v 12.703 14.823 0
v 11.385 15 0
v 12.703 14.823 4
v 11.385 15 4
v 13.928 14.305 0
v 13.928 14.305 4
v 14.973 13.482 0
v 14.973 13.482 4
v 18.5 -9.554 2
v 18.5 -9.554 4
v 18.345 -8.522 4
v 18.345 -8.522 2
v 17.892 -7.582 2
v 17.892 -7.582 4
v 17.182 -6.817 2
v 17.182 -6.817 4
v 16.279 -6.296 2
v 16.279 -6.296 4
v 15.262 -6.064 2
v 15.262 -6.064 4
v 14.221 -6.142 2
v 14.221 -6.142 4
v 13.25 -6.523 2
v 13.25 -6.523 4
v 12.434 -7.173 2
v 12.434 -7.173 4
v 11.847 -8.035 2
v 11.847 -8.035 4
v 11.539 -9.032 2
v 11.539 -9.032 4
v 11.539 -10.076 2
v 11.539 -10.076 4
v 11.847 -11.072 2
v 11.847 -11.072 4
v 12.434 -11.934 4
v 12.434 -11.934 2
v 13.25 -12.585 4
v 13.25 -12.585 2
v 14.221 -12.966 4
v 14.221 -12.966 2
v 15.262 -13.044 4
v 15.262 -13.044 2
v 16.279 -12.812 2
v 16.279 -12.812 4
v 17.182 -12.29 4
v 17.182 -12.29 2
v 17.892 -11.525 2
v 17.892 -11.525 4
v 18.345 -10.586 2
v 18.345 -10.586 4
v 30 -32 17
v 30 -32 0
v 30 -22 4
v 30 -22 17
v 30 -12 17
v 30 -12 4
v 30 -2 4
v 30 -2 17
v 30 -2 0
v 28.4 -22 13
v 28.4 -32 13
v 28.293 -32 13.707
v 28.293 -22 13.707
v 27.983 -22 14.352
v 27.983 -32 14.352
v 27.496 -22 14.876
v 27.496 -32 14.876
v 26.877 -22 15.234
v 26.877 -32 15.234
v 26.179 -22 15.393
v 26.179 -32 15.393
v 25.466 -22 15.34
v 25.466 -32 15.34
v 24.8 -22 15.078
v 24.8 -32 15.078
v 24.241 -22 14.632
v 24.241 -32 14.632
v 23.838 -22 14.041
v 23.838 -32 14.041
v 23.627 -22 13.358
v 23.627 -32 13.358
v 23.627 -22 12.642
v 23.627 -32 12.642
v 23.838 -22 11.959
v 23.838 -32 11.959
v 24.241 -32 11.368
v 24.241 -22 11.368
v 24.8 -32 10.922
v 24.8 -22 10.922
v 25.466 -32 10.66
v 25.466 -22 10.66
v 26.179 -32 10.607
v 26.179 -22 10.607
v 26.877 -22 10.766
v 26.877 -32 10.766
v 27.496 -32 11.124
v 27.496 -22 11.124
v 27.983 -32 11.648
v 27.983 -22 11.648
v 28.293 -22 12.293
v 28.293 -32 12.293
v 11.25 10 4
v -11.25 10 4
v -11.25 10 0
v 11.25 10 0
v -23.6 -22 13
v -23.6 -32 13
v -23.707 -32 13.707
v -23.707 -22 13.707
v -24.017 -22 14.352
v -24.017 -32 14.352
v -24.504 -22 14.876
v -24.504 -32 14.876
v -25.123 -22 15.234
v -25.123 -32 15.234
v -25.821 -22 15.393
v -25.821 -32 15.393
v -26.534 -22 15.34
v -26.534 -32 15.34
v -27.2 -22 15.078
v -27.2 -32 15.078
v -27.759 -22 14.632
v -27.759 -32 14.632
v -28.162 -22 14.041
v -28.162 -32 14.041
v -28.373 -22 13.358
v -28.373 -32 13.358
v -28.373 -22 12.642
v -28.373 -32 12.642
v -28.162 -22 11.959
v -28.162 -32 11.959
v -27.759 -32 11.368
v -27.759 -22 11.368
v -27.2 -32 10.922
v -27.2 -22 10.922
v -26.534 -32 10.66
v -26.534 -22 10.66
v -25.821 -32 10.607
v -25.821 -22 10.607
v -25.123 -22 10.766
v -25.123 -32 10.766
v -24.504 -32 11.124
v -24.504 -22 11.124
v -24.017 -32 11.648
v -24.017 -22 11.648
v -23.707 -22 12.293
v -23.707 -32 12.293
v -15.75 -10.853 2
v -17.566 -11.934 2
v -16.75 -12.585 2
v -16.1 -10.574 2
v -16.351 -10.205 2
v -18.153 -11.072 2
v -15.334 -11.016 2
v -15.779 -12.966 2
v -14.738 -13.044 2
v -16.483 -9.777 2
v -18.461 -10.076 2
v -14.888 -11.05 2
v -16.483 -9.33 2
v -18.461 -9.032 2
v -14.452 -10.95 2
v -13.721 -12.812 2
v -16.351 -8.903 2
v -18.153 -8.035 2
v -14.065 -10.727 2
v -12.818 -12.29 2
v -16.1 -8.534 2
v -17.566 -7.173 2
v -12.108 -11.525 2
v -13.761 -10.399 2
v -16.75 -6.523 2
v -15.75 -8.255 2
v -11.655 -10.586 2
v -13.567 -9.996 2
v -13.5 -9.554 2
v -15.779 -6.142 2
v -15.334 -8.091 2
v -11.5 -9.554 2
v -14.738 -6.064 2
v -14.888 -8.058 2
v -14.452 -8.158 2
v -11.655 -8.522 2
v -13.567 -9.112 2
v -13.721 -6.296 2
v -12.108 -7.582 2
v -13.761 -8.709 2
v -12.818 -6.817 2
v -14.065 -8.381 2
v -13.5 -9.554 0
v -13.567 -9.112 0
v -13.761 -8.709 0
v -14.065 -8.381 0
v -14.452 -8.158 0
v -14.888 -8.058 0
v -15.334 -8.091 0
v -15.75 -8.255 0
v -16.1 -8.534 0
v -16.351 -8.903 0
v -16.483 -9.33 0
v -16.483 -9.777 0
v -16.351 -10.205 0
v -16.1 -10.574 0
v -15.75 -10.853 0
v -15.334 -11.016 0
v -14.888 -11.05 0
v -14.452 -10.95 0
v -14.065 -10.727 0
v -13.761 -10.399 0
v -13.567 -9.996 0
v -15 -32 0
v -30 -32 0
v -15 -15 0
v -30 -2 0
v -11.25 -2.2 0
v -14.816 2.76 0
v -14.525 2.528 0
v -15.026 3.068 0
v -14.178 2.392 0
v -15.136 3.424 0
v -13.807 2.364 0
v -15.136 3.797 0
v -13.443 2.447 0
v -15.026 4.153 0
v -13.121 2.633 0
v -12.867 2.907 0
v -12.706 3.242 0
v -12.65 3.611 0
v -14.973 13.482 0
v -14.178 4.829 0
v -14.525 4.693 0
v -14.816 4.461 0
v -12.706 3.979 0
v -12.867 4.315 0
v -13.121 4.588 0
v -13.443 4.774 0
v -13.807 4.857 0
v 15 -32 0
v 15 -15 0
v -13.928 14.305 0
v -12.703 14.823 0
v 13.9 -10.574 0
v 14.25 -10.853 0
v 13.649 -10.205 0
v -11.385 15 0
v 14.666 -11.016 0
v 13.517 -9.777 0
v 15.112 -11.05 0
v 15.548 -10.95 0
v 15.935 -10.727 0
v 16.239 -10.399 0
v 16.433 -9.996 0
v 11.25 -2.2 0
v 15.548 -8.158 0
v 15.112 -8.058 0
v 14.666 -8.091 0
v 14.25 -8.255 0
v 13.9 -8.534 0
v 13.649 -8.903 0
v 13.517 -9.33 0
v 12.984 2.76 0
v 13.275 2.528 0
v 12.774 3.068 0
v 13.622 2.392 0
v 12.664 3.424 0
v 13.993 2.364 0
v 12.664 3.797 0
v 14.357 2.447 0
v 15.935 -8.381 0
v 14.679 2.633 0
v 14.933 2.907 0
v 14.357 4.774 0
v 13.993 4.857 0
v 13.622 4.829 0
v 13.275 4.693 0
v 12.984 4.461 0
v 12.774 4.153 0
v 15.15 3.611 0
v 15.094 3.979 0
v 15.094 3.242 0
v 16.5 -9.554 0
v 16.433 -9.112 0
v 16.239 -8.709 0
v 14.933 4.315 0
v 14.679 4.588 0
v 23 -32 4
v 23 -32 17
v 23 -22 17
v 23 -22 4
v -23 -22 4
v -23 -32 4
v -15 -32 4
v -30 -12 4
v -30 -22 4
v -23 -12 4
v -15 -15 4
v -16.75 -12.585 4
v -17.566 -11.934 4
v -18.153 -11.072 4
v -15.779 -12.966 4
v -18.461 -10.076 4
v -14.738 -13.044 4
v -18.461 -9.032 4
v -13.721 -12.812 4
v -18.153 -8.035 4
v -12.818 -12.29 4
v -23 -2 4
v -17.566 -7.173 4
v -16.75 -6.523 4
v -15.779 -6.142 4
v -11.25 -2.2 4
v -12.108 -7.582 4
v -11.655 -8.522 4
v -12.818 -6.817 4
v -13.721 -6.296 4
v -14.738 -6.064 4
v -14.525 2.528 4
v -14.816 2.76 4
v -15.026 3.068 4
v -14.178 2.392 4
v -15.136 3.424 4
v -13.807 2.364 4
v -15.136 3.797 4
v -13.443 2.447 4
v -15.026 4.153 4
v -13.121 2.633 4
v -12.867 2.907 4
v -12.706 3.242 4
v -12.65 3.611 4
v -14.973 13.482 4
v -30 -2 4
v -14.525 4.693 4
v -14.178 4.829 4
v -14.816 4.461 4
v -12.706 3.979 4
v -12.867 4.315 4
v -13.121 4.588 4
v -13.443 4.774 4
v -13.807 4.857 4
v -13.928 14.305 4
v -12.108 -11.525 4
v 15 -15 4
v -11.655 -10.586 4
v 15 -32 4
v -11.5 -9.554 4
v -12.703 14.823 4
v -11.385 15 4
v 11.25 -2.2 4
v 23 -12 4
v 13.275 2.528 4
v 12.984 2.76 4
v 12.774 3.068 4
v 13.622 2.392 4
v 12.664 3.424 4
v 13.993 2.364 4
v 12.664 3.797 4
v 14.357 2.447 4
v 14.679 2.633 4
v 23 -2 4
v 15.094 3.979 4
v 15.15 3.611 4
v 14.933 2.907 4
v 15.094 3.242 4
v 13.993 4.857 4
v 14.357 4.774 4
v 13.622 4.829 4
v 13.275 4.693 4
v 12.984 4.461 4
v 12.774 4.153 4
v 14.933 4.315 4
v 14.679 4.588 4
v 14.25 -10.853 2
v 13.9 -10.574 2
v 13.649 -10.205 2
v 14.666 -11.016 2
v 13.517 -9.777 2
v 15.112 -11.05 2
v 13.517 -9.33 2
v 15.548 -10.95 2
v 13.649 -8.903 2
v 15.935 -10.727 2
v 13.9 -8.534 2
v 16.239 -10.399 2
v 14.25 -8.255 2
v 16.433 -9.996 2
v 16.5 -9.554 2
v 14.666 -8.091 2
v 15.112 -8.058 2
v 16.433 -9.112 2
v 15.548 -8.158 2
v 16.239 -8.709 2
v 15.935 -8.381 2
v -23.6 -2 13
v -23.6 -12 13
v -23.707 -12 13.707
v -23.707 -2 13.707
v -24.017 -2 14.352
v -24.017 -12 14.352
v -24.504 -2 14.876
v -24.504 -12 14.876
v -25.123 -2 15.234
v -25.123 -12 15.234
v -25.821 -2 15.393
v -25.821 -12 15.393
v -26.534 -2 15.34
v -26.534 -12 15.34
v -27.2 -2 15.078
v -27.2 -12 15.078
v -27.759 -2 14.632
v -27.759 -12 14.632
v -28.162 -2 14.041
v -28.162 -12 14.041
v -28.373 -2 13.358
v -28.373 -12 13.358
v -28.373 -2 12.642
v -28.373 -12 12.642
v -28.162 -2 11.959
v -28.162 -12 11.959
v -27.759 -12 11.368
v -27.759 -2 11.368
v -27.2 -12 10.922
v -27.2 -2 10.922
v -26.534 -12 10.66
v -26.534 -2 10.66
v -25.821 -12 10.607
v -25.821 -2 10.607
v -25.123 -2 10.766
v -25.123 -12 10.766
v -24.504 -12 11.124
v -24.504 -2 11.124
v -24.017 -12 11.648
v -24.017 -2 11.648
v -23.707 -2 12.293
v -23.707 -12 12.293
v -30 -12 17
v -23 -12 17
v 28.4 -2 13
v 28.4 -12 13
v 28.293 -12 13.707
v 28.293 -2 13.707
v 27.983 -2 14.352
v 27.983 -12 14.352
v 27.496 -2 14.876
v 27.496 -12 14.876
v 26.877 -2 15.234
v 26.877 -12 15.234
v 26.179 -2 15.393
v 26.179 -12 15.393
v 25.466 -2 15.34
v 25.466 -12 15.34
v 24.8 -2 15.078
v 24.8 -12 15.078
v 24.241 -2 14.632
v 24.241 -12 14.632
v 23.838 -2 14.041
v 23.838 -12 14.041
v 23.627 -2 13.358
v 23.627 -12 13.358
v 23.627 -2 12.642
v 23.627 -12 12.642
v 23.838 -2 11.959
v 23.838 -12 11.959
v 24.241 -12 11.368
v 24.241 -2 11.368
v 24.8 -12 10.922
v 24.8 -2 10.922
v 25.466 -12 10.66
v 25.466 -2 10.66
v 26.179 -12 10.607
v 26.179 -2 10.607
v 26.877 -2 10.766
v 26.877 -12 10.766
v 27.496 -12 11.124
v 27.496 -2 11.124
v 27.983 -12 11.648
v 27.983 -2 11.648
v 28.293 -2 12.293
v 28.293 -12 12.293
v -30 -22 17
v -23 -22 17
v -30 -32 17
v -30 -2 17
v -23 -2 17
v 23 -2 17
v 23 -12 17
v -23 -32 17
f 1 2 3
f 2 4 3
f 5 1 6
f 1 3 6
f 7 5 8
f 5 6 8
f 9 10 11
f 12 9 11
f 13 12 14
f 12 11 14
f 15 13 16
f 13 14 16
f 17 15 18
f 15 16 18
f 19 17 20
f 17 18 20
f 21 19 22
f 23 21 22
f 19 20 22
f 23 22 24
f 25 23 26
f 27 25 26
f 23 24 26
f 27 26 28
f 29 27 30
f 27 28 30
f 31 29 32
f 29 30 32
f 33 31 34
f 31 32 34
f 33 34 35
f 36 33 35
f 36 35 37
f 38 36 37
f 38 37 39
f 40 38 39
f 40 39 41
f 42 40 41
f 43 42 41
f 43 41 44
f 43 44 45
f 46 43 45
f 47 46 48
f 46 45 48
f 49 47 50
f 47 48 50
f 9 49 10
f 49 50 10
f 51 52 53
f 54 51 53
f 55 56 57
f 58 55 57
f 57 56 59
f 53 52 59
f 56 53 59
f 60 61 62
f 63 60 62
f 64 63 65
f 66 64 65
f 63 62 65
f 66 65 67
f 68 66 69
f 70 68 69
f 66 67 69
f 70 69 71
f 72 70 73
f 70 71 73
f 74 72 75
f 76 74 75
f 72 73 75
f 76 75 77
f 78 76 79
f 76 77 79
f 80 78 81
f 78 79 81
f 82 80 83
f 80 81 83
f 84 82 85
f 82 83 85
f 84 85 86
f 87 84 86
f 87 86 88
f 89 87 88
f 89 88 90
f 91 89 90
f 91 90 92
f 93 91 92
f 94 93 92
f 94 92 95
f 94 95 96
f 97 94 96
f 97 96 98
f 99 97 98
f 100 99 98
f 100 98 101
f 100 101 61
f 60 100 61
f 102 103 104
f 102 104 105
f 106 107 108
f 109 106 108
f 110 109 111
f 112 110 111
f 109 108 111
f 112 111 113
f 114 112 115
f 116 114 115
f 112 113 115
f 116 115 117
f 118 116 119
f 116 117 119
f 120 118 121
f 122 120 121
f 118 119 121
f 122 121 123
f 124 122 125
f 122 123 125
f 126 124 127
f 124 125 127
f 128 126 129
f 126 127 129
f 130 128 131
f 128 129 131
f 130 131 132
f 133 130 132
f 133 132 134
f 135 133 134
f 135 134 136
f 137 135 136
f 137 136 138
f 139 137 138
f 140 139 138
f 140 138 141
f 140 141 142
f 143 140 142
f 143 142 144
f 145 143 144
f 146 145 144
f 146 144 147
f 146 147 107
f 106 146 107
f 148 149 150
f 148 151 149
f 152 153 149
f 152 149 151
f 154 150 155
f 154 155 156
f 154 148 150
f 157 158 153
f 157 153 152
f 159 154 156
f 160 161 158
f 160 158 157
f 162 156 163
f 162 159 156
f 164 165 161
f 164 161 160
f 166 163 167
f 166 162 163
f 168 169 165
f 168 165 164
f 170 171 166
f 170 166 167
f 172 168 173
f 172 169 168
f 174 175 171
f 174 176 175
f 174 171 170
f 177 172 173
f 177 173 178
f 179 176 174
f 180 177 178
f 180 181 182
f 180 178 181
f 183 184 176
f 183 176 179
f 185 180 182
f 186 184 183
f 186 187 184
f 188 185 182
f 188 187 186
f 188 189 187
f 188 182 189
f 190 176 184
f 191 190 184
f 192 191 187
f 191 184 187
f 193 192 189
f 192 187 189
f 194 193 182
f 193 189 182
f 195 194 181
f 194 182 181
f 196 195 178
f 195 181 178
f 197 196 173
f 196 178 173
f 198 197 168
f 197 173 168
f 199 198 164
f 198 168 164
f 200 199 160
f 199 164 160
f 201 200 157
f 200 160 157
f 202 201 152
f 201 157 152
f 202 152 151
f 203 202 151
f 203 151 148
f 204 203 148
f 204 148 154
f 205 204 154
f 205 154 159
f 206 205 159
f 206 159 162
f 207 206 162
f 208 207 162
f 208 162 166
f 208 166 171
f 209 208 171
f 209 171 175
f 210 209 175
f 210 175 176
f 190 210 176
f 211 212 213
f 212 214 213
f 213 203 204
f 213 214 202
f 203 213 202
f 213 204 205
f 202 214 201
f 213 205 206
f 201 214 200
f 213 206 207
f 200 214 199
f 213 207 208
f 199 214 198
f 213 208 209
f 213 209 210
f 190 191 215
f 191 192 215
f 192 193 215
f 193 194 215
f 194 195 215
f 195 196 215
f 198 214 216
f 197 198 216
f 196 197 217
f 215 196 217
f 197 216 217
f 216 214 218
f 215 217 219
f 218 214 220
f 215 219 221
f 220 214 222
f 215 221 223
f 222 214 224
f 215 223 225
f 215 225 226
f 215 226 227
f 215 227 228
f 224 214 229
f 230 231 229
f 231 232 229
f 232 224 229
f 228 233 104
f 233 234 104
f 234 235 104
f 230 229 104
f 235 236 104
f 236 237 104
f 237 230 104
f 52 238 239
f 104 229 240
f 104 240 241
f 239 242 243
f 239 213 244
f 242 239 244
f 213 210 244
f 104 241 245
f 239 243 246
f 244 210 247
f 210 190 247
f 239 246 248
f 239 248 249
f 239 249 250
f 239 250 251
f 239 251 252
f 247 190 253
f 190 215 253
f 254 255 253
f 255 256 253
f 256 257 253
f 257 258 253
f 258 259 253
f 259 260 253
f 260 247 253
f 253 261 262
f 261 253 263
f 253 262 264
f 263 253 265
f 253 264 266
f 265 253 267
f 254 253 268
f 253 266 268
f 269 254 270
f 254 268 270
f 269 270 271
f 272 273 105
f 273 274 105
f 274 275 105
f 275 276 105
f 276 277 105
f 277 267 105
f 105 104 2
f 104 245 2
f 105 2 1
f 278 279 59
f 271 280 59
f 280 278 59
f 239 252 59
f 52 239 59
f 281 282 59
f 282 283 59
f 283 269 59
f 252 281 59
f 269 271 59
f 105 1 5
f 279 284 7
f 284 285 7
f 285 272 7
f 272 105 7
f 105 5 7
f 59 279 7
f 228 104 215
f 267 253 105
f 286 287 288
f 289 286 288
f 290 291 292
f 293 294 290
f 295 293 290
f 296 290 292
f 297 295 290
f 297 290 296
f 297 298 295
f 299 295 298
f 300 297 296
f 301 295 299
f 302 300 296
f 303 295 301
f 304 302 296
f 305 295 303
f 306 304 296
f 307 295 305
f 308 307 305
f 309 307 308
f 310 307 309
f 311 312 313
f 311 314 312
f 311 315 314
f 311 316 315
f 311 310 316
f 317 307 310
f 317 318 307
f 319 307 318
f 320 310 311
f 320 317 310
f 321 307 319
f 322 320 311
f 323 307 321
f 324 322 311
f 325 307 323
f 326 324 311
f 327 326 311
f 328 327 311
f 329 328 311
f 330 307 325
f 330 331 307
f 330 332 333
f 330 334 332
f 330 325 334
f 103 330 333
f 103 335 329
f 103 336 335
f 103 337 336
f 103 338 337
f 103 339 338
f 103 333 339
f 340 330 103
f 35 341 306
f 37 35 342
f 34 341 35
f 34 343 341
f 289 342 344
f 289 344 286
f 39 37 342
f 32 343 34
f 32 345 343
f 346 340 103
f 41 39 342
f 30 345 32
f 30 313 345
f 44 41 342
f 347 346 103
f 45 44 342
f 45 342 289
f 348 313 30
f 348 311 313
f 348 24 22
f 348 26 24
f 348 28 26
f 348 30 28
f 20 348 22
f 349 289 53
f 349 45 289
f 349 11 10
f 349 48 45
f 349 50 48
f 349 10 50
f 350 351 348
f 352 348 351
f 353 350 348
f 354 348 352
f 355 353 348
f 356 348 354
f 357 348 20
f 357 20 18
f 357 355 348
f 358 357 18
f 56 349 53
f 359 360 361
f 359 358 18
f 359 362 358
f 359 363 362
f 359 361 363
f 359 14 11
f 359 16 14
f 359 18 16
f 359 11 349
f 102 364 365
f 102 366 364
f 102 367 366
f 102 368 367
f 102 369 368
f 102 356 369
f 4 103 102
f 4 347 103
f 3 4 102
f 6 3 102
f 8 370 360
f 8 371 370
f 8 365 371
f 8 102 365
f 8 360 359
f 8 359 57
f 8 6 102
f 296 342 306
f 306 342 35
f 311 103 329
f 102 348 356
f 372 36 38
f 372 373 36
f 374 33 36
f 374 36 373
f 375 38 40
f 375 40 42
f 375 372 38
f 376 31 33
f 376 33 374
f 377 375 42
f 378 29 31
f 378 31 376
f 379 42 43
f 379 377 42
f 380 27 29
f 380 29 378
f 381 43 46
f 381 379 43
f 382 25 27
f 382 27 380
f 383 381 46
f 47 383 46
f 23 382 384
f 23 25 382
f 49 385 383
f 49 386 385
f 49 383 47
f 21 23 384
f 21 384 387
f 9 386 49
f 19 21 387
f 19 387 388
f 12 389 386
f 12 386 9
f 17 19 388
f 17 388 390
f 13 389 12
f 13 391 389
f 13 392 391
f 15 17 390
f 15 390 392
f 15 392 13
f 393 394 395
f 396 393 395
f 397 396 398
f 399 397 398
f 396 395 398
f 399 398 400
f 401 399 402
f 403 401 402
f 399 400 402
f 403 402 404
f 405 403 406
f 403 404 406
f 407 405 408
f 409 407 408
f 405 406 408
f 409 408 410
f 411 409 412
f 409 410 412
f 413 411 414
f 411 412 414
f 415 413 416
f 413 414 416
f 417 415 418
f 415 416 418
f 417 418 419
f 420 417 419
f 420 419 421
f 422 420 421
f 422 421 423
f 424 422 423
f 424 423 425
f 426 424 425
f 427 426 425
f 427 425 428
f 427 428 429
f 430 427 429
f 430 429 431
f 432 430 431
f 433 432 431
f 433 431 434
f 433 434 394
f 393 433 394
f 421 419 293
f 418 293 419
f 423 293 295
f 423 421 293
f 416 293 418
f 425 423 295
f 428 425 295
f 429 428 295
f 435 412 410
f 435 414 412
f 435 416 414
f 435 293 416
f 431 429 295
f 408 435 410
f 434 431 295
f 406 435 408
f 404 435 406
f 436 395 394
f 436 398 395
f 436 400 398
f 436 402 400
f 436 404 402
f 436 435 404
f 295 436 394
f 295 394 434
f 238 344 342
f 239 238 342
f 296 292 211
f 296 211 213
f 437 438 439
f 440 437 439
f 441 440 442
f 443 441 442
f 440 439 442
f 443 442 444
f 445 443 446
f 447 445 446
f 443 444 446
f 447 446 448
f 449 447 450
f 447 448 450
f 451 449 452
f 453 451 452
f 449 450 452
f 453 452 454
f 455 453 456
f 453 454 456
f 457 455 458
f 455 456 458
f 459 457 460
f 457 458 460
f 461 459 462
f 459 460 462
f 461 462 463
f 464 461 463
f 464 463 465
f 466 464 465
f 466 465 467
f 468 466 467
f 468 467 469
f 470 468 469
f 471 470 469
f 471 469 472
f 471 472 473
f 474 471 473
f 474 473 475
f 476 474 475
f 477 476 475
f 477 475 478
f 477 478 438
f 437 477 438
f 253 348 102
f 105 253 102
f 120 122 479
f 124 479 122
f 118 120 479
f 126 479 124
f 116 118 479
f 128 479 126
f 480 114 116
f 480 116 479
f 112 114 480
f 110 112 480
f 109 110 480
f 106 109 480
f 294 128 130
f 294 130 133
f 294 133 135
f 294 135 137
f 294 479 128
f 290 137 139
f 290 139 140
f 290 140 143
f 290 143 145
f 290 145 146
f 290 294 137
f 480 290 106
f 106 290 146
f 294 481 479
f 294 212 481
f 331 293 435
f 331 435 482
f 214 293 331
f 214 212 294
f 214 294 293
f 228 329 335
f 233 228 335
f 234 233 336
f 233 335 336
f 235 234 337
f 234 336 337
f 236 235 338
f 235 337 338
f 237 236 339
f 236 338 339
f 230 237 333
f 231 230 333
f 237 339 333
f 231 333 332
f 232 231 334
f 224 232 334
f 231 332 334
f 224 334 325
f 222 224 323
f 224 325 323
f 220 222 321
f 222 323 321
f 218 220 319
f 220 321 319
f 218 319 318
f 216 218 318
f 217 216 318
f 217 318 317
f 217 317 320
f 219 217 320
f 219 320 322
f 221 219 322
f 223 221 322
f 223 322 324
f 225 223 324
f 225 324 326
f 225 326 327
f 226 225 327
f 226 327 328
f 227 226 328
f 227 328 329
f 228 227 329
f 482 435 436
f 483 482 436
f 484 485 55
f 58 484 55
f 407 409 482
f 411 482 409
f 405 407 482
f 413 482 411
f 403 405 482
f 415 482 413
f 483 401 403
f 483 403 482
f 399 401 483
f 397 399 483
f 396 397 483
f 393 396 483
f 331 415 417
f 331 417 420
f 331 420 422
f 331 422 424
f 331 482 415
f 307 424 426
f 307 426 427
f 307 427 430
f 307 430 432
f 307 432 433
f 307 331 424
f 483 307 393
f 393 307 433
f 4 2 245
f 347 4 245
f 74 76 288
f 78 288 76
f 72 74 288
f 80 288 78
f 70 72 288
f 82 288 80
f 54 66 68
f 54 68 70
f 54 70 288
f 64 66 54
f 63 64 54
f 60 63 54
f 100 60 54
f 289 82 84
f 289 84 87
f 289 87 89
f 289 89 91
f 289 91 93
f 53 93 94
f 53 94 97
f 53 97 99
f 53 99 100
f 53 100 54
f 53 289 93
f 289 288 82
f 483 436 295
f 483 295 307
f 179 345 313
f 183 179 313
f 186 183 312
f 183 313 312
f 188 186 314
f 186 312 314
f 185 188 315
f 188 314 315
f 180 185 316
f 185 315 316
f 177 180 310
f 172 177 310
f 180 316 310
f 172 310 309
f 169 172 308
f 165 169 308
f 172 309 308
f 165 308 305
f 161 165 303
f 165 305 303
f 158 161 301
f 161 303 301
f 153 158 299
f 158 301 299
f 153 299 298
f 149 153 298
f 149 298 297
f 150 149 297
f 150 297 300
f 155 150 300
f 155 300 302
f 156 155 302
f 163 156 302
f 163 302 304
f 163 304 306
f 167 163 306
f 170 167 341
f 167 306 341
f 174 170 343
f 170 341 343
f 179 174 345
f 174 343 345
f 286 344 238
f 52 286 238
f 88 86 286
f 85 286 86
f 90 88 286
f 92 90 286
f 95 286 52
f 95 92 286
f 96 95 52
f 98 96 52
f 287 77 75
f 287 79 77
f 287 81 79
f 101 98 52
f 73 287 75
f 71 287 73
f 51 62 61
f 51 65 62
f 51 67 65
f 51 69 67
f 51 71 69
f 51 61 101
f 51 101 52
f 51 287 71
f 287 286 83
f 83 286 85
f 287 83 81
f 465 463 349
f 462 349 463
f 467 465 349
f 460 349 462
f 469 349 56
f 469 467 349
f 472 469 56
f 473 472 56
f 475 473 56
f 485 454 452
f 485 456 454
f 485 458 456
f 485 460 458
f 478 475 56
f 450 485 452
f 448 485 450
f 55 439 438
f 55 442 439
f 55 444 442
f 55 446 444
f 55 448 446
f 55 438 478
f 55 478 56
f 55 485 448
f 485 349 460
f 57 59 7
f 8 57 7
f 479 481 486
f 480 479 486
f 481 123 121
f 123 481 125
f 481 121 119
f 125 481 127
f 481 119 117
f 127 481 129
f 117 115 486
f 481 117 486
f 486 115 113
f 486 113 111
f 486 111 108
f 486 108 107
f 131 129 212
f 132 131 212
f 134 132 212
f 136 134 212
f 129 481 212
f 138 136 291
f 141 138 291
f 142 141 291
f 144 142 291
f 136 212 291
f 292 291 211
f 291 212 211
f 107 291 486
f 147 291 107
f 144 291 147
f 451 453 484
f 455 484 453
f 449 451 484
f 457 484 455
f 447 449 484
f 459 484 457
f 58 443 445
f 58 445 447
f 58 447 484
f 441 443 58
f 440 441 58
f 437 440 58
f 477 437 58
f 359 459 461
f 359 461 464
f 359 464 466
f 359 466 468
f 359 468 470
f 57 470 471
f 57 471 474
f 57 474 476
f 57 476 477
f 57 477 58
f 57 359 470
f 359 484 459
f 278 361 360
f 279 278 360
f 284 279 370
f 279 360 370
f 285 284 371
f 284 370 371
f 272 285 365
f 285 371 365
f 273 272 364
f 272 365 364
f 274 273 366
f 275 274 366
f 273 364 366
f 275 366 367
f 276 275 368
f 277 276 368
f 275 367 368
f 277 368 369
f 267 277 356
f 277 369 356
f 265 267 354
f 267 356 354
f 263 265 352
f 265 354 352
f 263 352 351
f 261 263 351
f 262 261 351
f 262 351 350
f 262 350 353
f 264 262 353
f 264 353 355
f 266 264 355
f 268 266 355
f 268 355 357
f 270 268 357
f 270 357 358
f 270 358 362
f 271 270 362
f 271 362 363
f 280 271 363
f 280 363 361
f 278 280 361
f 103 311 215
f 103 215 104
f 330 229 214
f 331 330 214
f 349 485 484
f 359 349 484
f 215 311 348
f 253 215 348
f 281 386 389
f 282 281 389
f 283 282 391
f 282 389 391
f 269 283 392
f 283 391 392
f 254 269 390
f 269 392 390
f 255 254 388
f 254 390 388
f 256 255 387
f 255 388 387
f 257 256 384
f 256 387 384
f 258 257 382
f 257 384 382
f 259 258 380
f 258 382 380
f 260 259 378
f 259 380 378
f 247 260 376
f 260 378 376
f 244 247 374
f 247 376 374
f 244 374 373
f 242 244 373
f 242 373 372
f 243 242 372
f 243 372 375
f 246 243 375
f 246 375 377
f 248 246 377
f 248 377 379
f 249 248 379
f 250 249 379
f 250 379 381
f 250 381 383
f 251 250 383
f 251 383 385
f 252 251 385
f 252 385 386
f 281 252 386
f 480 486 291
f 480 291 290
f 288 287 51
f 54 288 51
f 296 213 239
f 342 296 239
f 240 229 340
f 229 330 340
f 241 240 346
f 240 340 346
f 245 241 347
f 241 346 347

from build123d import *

# Parameters (mm, degrees)
EXTRUDE_1_DEPTH          = 4
SKETCH_2_R               = 1.25
SKETCH_2_R_2             = 1.5
SKETCH_2_W               = 22.5
SKETCH_2_H               = 12.2
CUT_EXTRUDE_1_DEPTH      = 5
SKETCH_3_W               = 7
SKETCH_3_H               = 13
EXTRUDE_2_DEPTH          = 13
SKETCH_4_R               = 2.15
CUT_EXTRUDE_2_DEPTH      = 1
CUT_EXTRUDE_2_DEPTH_BACK = 31
FILLET_3_R               = 5
SKETCH_5_R               = 3.5
CUT_EXTRUDE_3_DEPTH      = 2
SKETCH_6_W               = 7
SKETCH_6_H               = 3
CUT_EXTRUDE_4_DEPTH      = 13
SKETCH_7_W               = 15
SKETCH_7_H               = 17
EXTRUDE_3_DEPTH          = 4
SKETCH_8_W               = 7
SKETCH_8_H               = 10
EXTRUDE_4_DEPTH          = 13
SKETCH_9_R               = 2.4
CUT_EXTRUDE_5_DEPTH      = 48


with BuildPart() as part:
    # 草图1 → 凸台-拉伸1 (new body)
    with BuildSketch(Plane.XY):
        Polygon((-30, -15), (30, -15), (30, -2), (13.5, 15), (-13.5, 15), (-30, -2), align=None)
    extrude(amount=EXTRUDE_1_DEPTH)

    # 草图2 → 切除-拉伸1 (cut, through all)
    with BuildSketch(Plane.XY.offset(4)):
        with Locations((-13.9, 3.610655805)):
            Circle(SKETCH_2_R)
        with Locations((13.9, 3.610655805)):
            Circle(SKETCH_2_R)
        with Locations((-15, -9.553859164)):
            Circle(SKETCH_2_R_2)
        with Locations((15, -9.553859164)):
            Circle(SKETCH_2_R_2)
        with Locations((0, 3.9)):
            Rectangle(SKETCH_2_W, SKETCH_2_H)
    extrude(amount=-CUT_EXTRUDE_1_DEPTH, mode=Mode.SUBTRACT)

    # 草图3 → 凸台-拉伸2 (add)
    with BuildSketch(Plane.XY.offset(4)):
        with Locations((-26.5, -8.5)):
            Rectangle(SKETCH_3_W, SKETCH_3_H)
        with Locations((26.5, -8.5)):
            Rectangle(SKETCH_3_W, SKETCH_3_H)
    extrude(amount=EXTRUDE_2_DEPTH)

    # 草图4 → 切除-拉伸2 (cut, two sides)
    with BuildSketch(Plane(origin=(0, -15, 0), x_dir=(-1, 0, 0), z_dir=(0, -1, 0))) as cut_extrude_2_sk:
        with Locations((26, -13)):
            Circle(SKETCH_4_R)
        with Locations((-26, -13)):
            Circle(SKETCH_4_R)
    extrude(amount=CUT_EXTRUDE_2_DEPTH, mode=Mode.SUBTRACT)
    extrude(cut_extrude_2_sk.sketch, amount=-CUT_EXTRUDE_2_DEPTH_BACK, mode=Mode.SUBTRACT)

    # 圆角3
    fillet_3_edges = [part.edges().sort_by_distance(p)[0] for p in [
        (-13.5, 15, 2),
        (13.5, 15, 2),
    ]]
    fillet(fillet_3_edges, radius=FILLET_3_R)

    # 草图5 → 切除-拉伸3 (cut)
    with BuildSketch(Plane.XY.offset(4)):
        with Locations((-15, -9.553859164)):
            Circle(SKETCH_5_R)
        with Locations((15, -9.553859164)):
            Circle(SKETCH_5_R)
    extrude(amount=-CUT_EXTRUDE_3_DEPTH, mode=Mode.SUBTRACT)

    # 草图6 → 切除-拉伸4 (cut)
    with BuildSketch(Plane.XY.offset(17)):
        with Locations((-26.5, -13.5)):
            Rectangle(SKETCH_6_W, SKETCH_6_H)
        with Locations((26.5, -13.5)):
            Rectangle(SKETCH_6_W, SKETCH_6_H)
    extrude(amount=-CUT_EXTRUDE_4_DEPTH, mode=Mode.SUBTRACT)

    # 草图7 → 凸台-拉伸3 (add)
    with BuildSketch(Plane.XY.offset(4)):
        with Locations((-22.5, -23.5)):
            Rectangle(SKETCH_7_W, SKETCH_7_H)
        with Locations((22.5, -23.5)):
            Rectangle(SKETCH_7_W, SKETCH_7_H)
    extrude(amount=-EXTRUDE_3_DEPTH)

    # 草图8 → 凸台-拉伸4 (add)
    with BuildSketch(Plane.XY.offset(4)):
        with Locations((-26.5, -27)):
            Rectangle(SKETCH_8_W, SKETCH_8_H)
        with Locations((26.5, -27)):
            Rectangle(SKETCH_8_W, SKETCH_8_H)
    extrude(amount=EXTRUDE_4_DEPTH)

    # 草图9 → 切除-拉伸5 (cut, through all)
    with BuildSketch(Plane.XZ.offset(32)):
        with Locations((-26, 13)):
            Circle(SKETCH_9_R)
        with Locations((26, 13)):
            Circle(SKETCH_9_R)
    extrude(amount=-CUT_EXTRUDE_5_DEPTH, mode=Mode.SUBTRACT)


solid = part.part
